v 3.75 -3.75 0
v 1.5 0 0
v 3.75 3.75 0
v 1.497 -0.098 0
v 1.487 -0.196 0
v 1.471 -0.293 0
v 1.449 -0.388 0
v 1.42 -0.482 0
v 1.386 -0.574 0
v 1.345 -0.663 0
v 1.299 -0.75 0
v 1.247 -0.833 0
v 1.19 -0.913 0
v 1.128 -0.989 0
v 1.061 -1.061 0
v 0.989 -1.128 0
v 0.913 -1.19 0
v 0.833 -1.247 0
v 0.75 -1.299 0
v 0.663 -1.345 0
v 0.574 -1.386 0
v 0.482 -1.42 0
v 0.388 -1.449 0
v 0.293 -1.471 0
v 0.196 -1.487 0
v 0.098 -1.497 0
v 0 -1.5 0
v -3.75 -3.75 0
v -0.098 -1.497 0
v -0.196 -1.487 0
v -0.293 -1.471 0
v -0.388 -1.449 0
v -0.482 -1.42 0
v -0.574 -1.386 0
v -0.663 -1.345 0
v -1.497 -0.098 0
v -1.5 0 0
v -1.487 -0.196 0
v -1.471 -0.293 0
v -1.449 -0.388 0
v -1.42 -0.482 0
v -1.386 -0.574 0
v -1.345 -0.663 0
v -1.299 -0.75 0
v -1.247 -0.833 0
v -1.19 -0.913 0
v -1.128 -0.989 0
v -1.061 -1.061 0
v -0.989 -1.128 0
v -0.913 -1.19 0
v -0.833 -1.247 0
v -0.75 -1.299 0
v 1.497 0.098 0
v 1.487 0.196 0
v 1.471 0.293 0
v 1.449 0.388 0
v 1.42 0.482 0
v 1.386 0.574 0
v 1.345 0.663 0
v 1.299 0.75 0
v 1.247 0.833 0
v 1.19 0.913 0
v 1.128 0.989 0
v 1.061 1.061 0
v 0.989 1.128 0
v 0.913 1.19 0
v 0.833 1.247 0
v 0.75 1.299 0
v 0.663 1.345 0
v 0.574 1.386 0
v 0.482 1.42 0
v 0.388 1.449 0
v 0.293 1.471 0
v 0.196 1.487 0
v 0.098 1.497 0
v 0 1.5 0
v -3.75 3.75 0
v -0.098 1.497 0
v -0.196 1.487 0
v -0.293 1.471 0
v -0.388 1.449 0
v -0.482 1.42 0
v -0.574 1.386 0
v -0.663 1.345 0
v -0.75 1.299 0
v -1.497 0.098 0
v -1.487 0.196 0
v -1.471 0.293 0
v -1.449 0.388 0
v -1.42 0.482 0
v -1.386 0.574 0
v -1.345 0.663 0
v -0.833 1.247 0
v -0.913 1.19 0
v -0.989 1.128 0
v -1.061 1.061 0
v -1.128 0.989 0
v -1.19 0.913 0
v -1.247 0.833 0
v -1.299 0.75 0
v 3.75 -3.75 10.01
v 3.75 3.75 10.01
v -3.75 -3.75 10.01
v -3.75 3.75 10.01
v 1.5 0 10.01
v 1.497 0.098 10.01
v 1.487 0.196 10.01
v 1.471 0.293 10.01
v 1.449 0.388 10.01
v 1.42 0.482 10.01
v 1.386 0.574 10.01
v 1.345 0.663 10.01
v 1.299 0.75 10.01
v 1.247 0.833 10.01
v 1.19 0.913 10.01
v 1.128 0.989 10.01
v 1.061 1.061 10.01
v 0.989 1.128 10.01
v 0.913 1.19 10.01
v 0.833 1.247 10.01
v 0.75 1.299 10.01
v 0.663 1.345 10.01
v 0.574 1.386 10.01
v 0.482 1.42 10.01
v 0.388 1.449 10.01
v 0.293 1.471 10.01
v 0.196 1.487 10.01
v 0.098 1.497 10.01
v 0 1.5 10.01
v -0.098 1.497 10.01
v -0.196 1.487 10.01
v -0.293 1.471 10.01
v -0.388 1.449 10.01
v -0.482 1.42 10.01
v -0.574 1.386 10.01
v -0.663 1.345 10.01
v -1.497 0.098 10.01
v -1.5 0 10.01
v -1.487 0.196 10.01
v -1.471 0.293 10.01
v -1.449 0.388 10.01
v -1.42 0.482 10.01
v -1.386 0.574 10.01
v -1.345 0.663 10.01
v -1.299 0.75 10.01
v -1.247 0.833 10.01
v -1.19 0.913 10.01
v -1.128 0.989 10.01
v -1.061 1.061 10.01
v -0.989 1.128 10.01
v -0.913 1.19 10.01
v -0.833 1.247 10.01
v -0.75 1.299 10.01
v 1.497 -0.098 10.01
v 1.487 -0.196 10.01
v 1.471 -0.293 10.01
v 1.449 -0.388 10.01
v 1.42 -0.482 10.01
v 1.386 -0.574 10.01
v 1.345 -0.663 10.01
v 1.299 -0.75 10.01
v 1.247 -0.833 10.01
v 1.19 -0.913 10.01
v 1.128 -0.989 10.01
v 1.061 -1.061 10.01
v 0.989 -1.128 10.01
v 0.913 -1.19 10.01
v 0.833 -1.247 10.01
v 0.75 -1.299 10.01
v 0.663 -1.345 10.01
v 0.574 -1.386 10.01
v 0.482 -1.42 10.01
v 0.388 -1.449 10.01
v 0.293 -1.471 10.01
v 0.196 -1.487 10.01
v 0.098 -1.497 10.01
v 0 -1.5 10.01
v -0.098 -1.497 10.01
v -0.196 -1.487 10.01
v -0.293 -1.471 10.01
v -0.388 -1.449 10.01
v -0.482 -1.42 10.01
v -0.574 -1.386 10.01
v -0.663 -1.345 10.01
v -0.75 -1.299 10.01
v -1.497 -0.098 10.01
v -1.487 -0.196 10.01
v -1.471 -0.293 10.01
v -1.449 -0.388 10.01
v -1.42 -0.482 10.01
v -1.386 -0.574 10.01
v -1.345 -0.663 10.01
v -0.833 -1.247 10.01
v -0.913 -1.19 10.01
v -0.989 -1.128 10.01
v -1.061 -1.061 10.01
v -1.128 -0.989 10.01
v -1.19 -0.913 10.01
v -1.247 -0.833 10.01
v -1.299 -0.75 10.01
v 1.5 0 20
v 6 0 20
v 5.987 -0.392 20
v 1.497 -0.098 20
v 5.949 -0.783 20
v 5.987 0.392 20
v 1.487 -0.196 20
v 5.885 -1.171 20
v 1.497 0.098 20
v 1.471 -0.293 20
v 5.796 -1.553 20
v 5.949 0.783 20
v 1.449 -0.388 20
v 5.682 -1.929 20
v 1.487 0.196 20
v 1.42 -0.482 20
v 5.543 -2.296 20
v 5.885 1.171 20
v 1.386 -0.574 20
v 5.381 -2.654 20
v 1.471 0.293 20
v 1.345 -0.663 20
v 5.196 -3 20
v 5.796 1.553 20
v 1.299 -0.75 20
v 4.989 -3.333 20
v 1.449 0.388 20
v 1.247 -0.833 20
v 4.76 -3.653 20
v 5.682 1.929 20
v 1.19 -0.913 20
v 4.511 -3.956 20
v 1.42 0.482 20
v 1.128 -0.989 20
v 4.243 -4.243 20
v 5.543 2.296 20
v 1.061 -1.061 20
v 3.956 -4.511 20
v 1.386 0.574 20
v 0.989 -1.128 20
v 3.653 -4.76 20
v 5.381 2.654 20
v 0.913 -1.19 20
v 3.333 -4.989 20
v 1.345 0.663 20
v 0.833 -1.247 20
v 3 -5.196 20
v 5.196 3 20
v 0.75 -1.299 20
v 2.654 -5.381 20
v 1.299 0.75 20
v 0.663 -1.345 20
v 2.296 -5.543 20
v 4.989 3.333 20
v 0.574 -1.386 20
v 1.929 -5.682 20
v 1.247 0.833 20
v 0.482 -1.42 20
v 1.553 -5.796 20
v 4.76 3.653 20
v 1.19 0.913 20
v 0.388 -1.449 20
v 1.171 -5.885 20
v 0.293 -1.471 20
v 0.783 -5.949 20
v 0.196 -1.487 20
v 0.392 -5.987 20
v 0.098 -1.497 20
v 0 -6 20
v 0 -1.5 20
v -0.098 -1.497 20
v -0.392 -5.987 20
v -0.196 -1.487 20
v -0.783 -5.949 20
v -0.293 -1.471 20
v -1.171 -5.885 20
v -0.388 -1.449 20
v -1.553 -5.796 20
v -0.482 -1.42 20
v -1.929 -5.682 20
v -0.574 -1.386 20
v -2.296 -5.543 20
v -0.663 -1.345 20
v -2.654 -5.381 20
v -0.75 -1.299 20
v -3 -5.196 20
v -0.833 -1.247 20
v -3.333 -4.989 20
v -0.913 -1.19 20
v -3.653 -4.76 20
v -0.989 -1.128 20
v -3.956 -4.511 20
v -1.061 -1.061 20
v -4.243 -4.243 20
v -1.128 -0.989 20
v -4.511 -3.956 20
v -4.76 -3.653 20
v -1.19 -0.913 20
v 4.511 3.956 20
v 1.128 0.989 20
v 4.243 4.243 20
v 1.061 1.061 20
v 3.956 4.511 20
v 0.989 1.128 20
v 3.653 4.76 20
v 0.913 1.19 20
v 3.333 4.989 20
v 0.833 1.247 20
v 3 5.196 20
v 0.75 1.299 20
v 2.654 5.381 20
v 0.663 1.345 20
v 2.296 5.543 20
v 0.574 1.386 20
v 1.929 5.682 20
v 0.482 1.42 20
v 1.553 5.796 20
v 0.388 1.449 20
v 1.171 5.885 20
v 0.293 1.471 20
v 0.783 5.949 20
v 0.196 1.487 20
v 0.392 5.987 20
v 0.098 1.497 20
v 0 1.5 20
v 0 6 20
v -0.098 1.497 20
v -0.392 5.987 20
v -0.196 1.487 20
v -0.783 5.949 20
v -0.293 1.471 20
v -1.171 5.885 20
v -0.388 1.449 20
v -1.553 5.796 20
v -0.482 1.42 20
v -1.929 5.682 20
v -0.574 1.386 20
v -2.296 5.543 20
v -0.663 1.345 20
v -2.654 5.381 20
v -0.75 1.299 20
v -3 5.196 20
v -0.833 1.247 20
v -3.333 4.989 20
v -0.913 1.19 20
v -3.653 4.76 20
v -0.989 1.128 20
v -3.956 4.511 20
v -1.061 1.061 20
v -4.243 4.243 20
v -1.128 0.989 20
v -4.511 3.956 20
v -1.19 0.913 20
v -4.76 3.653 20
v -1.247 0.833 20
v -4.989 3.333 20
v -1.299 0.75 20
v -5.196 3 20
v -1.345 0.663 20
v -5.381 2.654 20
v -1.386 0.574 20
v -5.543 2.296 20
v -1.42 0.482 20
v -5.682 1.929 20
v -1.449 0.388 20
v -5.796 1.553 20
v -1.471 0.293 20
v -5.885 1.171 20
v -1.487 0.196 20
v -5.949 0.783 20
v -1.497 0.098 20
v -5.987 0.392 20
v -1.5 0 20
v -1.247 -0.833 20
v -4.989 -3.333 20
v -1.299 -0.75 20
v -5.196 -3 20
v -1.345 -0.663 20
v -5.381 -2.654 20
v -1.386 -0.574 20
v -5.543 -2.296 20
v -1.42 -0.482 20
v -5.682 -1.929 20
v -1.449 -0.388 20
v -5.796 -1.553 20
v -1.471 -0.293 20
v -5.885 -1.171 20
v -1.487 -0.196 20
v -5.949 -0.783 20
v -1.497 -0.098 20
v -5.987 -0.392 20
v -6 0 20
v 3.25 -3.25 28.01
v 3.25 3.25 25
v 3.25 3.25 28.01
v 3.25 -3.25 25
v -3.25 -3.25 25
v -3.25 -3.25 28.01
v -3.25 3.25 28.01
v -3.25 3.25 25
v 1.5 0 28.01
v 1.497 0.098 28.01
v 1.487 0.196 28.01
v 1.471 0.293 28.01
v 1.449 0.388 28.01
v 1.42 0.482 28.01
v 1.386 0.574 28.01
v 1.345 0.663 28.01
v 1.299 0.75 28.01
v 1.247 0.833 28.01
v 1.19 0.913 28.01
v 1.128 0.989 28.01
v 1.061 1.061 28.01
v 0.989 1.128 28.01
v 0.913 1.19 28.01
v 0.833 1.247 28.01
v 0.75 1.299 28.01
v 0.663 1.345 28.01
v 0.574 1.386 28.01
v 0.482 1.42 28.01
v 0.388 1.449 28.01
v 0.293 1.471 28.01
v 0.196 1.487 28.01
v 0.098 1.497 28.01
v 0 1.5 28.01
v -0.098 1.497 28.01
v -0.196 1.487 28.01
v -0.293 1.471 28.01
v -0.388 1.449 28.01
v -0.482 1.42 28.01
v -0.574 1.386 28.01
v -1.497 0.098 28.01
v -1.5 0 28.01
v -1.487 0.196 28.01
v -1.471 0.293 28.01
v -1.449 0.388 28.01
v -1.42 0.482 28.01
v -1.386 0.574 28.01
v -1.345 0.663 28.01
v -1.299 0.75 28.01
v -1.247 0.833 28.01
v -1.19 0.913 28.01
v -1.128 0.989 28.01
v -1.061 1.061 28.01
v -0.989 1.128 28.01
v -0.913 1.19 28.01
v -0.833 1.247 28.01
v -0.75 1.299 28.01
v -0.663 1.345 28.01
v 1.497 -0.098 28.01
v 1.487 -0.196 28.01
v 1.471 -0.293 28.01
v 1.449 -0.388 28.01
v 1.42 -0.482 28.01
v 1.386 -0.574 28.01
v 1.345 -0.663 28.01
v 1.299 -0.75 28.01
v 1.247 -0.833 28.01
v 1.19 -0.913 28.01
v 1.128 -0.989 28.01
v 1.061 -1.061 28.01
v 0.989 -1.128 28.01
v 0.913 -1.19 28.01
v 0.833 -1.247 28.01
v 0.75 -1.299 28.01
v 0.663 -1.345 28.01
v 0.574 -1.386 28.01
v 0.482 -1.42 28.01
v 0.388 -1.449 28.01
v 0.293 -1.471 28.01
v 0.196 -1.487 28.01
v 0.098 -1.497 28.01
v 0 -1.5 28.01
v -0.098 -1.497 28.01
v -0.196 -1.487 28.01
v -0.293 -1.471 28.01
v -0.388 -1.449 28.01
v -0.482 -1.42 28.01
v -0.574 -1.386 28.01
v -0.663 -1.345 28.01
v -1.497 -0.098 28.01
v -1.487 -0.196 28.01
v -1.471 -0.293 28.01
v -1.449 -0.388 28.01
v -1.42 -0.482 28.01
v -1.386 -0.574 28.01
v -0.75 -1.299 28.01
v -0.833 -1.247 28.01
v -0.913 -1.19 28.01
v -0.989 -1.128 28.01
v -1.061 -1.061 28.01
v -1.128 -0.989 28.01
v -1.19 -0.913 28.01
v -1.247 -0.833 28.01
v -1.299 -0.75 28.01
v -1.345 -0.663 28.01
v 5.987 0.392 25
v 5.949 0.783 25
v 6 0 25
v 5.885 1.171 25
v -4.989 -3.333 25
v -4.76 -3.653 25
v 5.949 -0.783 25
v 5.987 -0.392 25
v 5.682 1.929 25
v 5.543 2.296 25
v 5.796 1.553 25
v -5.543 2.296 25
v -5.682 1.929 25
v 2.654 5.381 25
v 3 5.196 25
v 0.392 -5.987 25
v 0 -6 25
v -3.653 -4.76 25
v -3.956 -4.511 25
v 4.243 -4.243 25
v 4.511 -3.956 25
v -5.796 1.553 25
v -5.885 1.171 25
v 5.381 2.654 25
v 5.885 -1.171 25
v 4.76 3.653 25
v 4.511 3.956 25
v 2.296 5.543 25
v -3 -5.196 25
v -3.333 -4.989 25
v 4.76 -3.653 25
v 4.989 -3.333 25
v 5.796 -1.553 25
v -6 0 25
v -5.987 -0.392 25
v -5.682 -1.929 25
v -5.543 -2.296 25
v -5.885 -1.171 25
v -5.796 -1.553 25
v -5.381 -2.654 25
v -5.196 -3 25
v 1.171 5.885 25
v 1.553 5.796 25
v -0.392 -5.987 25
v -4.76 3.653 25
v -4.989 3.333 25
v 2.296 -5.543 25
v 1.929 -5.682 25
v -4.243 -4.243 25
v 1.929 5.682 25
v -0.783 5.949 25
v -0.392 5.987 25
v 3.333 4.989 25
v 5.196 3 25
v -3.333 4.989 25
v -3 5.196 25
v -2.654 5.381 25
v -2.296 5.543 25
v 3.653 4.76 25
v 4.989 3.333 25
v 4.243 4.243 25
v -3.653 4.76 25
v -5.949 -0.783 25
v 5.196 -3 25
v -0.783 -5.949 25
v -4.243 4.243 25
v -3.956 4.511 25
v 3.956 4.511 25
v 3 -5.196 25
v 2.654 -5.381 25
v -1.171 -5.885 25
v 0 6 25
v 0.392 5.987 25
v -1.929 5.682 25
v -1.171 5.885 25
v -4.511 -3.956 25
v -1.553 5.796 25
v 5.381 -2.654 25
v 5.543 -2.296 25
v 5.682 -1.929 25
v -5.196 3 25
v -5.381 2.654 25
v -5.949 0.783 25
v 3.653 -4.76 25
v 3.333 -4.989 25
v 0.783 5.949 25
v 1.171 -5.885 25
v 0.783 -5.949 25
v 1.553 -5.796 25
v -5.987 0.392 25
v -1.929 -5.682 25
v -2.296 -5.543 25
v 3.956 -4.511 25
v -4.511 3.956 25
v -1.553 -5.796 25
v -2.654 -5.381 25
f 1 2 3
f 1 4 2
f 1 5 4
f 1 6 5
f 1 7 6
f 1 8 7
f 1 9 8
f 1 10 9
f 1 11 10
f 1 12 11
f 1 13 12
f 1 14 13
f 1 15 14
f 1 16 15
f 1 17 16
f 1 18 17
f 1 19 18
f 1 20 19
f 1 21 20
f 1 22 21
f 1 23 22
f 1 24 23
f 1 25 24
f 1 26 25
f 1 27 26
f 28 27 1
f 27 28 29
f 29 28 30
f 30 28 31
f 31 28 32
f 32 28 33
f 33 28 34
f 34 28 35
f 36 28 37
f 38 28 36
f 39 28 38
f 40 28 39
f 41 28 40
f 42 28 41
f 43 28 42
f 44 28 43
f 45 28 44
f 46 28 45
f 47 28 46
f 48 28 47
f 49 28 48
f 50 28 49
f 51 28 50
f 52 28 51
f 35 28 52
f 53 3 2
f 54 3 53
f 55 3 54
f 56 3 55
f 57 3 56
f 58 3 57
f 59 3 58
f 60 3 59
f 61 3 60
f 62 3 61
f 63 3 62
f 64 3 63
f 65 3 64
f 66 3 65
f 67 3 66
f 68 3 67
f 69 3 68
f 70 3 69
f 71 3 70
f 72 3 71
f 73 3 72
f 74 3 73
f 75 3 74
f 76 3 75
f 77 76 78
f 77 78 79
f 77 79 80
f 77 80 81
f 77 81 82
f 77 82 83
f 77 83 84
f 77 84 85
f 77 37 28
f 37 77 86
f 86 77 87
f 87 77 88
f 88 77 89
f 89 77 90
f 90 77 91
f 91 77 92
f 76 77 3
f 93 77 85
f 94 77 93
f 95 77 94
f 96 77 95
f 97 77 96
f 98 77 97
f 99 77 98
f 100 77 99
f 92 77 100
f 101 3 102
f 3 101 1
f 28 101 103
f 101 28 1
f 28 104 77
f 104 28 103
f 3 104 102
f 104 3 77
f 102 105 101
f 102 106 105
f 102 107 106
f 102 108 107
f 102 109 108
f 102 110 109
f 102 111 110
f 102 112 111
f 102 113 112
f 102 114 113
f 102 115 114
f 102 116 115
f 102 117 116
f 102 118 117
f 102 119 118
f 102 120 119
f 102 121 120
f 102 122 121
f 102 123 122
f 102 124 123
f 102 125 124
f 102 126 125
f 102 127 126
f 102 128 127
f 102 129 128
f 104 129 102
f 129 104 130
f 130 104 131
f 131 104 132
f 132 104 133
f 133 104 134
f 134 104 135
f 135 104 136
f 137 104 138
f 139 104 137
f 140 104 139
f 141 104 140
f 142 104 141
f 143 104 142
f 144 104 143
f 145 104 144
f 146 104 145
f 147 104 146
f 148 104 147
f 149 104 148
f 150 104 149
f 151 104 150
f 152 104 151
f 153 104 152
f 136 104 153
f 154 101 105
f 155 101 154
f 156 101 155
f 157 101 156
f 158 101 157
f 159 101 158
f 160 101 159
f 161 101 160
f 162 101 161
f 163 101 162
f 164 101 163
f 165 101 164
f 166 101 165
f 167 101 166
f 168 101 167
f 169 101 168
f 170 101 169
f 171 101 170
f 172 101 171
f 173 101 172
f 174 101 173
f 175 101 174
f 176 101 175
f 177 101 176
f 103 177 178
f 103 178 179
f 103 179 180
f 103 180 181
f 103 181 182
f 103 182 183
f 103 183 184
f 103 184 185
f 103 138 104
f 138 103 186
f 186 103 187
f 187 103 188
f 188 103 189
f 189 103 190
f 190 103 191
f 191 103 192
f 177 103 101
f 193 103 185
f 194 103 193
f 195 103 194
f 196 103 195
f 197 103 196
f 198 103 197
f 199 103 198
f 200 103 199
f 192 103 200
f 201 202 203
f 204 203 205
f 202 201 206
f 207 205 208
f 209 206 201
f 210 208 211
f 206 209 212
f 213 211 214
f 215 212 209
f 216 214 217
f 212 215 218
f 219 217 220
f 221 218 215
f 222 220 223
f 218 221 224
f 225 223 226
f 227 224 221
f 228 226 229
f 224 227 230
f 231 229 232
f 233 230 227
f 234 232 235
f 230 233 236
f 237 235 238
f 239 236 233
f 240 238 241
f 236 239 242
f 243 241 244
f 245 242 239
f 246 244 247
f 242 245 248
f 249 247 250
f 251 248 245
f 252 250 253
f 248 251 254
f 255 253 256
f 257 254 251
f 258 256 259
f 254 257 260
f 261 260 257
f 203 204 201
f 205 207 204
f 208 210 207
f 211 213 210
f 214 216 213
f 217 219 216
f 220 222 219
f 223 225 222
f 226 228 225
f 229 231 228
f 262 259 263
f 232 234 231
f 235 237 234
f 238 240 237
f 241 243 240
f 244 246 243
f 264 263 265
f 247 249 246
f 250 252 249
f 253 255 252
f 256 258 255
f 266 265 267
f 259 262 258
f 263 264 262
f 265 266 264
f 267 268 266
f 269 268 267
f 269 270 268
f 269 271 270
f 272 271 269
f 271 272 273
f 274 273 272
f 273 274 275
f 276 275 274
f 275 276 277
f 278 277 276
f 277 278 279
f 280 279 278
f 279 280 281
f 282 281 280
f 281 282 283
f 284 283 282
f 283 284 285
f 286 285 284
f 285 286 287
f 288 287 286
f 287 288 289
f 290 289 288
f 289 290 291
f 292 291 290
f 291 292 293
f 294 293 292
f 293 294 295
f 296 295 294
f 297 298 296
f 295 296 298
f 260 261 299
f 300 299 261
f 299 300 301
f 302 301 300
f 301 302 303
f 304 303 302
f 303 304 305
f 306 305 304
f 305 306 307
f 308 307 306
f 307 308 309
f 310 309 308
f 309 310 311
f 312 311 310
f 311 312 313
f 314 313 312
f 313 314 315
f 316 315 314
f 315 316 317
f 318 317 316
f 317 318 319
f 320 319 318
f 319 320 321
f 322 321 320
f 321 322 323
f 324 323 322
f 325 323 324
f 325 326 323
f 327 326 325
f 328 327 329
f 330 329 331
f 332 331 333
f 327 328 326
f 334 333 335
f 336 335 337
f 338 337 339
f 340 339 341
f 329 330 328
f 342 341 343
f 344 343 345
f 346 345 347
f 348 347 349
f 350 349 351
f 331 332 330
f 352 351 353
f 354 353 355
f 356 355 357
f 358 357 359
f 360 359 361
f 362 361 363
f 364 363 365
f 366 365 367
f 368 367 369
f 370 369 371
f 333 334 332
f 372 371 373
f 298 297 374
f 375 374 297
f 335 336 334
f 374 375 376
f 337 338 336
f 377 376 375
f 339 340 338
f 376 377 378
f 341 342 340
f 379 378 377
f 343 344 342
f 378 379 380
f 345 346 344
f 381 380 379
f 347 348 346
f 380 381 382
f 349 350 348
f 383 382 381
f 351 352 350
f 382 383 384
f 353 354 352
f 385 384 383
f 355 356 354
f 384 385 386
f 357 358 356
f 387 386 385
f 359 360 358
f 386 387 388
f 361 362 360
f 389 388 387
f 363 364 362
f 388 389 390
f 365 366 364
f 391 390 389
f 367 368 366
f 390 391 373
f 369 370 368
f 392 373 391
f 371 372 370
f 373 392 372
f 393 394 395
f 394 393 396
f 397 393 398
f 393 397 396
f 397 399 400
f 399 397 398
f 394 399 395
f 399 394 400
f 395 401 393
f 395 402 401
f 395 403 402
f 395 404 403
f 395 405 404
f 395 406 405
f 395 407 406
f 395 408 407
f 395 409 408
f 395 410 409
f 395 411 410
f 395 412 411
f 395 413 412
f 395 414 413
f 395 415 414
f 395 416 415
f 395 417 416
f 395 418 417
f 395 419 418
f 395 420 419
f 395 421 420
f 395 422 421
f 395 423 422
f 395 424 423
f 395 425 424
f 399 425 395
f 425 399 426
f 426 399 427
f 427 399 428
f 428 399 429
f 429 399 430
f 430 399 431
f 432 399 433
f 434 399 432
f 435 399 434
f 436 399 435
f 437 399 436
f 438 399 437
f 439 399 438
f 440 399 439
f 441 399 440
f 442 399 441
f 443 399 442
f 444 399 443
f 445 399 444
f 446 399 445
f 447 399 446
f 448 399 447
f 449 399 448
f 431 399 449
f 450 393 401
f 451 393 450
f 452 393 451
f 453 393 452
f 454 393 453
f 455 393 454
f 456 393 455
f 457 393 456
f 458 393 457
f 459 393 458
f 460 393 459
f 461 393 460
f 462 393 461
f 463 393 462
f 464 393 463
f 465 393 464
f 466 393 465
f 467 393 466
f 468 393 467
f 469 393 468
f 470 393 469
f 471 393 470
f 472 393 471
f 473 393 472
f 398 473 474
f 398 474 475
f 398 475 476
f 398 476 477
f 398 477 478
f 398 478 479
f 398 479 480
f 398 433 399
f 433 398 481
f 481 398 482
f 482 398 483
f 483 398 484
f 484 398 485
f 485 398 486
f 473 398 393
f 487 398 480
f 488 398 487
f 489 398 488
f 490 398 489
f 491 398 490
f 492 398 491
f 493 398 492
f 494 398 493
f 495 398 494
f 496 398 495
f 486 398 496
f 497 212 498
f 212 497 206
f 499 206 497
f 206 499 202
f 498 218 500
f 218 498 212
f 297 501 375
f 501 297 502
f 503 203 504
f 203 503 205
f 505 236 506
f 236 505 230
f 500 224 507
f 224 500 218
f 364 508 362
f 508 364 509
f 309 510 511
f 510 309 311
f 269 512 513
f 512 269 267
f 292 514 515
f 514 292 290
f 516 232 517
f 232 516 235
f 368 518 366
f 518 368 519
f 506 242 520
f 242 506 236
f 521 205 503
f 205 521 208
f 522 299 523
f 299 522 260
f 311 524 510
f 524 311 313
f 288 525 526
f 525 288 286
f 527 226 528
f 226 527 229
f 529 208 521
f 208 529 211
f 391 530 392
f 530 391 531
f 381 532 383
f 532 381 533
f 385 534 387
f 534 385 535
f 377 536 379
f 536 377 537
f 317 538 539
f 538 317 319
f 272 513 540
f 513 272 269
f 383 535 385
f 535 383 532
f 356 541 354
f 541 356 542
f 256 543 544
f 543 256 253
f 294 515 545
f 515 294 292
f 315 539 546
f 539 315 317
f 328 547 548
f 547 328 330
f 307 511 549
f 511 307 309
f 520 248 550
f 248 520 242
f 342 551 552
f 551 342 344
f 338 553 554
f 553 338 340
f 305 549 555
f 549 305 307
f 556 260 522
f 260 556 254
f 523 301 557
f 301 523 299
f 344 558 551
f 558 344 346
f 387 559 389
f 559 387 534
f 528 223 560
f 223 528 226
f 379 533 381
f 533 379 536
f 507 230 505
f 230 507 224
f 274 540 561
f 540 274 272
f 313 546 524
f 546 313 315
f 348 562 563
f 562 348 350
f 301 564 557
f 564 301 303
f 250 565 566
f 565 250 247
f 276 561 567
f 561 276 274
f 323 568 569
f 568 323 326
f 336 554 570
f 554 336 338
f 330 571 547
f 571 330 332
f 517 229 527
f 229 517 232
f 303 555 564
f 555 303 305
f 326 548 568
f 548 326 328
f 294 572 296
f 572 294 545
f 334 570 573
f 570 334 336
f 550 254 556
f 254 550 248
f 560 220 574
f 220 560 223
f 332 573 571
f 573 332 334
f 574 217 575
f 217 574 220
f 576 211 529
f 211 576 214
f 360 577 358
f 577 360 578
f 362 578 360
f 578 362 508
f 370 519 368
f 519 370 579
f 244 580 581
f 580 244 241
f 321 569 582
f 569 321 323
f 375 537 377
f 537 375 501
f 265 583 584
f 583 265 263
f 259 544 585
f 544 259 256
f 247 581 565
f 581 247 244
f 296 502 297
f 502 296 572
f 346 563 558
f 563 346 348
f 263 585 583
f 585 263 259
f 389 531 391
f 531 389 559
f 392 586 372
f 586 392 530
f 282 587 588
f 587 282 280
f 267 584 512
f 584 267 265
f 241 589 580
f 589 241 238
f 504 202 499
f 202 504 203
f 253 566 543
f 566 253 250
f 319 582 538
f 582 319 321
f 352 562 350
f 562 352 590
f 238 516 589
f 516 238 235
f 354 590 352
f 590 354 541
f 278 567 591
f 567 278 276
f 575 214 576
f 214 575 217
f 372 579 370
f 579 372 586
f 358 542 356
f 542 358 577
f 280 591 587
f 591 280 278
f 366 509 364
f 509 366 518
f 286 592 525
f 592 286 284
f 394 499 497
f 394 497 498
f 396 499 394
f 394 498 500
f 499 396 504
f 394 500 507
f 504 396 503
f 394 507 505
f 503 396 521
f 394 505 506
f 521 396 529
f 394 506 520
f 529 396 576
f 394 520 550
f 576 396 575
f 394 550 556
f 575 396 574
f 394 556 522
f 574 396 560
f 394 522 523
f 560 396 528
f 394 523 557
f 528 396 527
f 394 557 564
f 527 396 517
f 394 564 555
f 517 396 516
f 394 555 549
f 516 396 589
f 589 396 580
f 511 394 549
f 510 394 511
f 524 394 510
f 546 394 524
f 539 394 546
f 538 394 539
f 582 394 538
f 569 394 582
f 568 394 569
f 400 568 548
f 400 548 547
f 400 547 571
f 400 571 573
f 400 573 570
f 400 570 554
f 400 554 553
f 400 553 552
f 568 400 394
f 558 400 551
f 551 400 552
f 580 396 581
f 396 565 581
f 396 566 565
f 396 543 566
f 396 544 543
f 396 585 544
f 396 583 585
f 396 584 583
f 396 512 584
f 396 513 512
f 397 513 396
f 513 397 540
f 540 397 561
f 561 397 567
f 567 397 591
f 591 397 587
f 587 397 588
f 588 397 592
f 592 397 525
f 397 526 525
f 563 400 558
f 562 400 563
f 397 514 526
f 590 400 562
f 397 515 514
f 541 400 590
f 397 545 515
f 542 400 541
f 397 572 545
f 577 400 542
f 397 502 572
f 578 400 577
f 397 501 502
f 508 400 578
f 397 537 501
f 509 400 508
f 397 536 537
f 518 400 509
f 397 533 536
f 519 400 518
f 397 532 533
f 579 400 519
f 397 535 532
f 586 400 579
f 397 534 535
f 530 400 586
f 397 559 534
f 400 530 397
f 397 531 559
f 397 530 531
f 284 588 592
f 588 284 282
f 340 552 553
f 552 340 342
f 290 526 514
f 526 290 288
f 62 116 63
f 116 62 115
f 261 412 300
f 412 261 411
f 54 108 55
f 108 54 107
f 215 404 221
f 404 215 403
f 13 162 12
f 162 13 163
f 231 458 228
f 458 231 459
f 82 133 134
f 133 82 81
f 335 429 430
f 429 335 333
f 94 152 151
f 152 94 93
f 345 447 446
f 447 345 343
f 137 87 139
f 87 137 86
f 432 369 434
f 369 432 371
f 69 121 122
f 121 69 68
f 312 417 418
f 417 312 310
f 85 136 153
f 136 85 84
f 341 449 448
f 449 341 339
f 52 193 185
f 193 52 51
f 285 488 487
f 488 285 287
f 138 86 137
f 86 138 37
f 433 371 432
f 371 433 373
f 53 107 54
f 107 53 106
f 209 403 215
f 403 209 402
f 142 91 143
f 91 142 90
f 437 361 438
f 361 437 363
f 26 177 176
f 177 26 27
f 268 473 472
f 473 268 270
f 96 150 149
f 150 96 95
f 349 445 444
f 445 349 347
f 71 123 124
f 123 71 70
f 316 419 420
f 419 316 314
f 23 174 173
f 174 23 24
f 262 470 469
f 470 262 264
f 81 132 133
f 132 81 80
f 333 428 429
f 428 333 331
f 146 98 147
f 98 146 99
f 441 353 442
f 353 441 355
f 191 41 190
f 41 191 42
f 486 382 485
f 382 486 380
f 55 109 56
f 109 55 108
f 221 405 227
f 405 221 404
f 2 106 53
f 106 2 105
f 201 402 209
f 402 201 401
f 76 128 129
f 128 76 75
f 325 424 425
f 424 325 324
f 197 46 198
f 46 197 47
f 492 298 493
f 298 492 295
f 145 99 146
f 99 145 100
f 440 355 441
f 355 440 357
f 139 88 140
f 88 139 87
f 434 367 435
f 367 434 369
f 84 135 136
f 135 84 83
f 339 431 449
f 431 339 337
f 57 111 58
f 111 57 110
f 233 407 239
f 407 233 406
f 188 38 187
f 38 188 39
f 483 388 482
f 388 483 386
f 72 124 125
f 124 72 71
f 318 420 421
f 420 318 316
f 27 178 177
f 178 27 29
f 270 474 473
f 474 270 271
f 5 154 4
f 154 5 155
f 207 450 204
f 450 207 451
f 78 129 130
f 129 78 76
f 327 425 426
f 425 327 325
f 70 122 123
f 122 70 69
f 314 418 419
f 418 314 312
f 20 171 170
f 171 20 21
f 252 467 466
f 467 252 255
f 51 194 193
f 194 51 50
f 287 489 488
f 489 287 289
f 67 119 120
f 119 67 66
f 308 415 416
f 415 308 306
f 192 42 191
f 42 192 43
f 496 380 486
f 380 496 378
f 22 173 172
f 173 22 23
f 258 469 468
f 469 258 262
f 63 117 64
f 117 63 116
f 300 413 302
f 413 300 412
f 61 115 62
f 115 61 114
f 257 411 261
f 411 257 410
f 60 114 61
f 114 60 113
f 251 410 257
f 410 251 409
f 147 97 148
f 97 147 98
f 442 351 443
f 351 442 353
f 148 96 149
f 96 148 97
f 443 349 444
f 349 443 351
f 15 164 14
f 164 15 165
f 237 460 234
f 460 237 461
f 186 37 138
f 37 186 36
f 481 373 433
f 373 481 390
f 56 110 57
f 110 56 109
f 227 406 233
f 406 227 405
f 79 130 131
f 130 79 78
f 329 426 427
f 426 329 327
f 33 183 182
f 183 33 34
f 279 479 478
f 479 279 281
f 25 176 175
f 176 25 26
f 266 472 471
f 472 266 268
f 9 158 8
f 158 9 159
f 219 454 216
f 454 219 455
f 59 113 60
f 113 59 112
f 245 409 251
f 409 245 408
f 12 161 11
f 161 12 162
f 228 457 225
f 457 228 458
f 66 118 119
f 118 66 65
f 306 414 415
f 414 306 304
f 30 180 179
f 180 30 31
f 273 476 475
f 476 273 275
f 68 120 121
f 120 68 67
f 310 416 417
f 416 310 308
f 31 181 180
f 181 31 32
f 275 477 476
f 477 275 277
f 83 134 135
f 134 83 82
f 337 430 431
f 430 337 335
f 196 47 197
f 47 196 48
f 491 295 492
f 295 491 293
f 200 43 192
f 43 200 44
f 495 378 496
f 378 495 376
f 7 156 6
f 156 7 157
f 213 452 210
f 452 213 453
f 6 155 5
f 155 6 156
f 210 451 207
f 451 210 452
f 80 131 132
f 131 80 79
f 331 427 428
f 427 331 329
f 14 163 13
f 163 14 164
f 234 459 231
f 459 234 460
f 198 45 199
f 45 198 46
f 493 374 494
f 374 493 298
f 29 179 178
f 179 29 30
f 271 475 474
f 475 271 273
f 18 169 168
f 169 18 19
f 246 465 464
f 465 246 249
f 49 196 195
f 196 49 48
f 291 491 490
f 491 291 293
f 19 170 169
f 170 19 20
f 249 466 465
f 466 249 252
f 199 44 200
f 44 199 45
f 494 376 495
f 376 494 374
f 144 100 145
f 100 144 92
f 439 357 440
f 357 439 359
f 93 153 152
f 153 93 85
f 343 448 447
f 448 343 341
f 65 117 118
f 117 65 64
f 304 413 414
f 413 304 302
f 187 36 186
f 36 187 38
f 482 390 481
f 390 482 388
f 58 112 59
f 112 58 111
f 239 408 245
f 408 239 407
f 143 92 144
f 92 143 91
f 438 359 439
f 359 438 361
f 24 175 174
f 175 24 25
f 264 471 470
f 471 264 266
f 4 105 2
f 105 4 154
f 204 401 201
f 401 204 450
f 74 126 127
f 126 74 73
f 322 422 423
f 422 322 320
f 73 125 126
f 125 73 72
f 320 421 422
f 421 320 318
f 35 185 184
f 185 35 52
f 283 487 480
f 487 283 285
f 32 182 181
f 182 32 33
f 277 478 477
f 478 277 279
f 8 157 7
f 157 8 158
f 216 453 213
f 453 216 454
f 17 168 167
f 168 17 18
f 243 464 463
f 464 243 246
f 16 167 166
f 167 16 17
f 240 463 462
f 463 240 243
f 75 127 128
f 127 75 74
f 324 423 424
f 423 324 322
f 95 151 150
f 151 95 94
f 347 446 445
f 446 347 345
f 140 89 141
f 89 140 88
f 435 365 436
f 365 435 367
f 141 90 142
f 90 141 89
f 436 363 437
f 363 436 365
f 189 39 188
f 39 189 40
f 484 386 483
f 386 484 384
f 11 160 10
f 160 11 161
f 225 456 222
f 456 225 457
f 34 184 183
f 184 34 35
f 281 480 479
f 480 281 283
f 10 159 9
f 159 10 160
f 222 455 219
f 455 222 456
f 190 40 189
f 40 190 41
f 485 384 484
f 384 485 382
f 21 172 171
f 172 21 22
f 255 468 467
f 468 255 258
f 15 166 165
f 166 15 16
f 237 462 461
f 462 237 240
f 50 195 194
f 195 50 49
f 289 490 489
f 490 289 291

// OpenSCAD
// Hose-barb reducer: 8 mm ID tubing to 5 mm ID tubing
// Print orientation: standing upright along Z, centred on origin in X/Y

$fn = 96;

// ---- Dimensions (mm) ----
eps      = 0.5;     // cutter overshoot
barb_h8  = 10;      // height of each 8 mm barb
od8_bot  = 7.5;     // outer diameter of 8 mm barb at bottom
od8_top  = 9.5;     // outer diameter of 8 mm barb at top
collar_d = 12;      // diameter of cylindrical collar
barb_h5  = 8;       // height of each 5 mm barb
od5_bot  = 6.5;     // outer diameter of 5 mm barb at bottom
od5_top  = 5.0;     // outer diameter of 5 mm barb at top
bore     = 3;       // central through-bore diameter
length8  = 20;      // z extent of 8 mm tubing section
length5  = 16;      // z extent of 5 mm tubing section (z = 25 to 41)
overlap  = 0.01;    // small overlap between stacked barbs for clean union

// ---- Model ----
difference() {
    union() {
        // 8 mm tubing section: two stacked barbs with sawtooth profile
        for (i = [-1, 1])
            translate([0, 0, i > 0 ? overlap : 0])
                linear_extrude(height = barb_h8)
                    polygon([
                        [-od8_bot / 2, -od8_bot / 2],
                        [od8_bot / 2, -od8_bot / 2],
                        [od8_bot / 2, od8_bot / 2],
                        [-od8_bot / 2, od8_bot / 2]
                    ]);
        // collar
        translate([0, 0, length8])
            cylinder(d = collar_d, h = 5);
        // 5 mm tubing section: two stacked barbs, shrinking OD
        for (i = [-1, 1])
            translate([0, 0, length8 + (i > 0 ? overlap : 0)])
                linear_extrude(height = barb_h5)
                    polygon([
                        [-od5_bot / 2, -od5_bot / 2],
                        [od5_bot / 2, -od5_bot / 2],
                        [od5_bot / 2, od5_bot / 2],
                        [-od5_bot / 2, od5_bot / 2]
                    ]);
    }
    // central bore through full length
    translate([0, 0, -eps])
        cylinder(d = bore, h = length8 + 5 + length5 + 2 * eps);
}
